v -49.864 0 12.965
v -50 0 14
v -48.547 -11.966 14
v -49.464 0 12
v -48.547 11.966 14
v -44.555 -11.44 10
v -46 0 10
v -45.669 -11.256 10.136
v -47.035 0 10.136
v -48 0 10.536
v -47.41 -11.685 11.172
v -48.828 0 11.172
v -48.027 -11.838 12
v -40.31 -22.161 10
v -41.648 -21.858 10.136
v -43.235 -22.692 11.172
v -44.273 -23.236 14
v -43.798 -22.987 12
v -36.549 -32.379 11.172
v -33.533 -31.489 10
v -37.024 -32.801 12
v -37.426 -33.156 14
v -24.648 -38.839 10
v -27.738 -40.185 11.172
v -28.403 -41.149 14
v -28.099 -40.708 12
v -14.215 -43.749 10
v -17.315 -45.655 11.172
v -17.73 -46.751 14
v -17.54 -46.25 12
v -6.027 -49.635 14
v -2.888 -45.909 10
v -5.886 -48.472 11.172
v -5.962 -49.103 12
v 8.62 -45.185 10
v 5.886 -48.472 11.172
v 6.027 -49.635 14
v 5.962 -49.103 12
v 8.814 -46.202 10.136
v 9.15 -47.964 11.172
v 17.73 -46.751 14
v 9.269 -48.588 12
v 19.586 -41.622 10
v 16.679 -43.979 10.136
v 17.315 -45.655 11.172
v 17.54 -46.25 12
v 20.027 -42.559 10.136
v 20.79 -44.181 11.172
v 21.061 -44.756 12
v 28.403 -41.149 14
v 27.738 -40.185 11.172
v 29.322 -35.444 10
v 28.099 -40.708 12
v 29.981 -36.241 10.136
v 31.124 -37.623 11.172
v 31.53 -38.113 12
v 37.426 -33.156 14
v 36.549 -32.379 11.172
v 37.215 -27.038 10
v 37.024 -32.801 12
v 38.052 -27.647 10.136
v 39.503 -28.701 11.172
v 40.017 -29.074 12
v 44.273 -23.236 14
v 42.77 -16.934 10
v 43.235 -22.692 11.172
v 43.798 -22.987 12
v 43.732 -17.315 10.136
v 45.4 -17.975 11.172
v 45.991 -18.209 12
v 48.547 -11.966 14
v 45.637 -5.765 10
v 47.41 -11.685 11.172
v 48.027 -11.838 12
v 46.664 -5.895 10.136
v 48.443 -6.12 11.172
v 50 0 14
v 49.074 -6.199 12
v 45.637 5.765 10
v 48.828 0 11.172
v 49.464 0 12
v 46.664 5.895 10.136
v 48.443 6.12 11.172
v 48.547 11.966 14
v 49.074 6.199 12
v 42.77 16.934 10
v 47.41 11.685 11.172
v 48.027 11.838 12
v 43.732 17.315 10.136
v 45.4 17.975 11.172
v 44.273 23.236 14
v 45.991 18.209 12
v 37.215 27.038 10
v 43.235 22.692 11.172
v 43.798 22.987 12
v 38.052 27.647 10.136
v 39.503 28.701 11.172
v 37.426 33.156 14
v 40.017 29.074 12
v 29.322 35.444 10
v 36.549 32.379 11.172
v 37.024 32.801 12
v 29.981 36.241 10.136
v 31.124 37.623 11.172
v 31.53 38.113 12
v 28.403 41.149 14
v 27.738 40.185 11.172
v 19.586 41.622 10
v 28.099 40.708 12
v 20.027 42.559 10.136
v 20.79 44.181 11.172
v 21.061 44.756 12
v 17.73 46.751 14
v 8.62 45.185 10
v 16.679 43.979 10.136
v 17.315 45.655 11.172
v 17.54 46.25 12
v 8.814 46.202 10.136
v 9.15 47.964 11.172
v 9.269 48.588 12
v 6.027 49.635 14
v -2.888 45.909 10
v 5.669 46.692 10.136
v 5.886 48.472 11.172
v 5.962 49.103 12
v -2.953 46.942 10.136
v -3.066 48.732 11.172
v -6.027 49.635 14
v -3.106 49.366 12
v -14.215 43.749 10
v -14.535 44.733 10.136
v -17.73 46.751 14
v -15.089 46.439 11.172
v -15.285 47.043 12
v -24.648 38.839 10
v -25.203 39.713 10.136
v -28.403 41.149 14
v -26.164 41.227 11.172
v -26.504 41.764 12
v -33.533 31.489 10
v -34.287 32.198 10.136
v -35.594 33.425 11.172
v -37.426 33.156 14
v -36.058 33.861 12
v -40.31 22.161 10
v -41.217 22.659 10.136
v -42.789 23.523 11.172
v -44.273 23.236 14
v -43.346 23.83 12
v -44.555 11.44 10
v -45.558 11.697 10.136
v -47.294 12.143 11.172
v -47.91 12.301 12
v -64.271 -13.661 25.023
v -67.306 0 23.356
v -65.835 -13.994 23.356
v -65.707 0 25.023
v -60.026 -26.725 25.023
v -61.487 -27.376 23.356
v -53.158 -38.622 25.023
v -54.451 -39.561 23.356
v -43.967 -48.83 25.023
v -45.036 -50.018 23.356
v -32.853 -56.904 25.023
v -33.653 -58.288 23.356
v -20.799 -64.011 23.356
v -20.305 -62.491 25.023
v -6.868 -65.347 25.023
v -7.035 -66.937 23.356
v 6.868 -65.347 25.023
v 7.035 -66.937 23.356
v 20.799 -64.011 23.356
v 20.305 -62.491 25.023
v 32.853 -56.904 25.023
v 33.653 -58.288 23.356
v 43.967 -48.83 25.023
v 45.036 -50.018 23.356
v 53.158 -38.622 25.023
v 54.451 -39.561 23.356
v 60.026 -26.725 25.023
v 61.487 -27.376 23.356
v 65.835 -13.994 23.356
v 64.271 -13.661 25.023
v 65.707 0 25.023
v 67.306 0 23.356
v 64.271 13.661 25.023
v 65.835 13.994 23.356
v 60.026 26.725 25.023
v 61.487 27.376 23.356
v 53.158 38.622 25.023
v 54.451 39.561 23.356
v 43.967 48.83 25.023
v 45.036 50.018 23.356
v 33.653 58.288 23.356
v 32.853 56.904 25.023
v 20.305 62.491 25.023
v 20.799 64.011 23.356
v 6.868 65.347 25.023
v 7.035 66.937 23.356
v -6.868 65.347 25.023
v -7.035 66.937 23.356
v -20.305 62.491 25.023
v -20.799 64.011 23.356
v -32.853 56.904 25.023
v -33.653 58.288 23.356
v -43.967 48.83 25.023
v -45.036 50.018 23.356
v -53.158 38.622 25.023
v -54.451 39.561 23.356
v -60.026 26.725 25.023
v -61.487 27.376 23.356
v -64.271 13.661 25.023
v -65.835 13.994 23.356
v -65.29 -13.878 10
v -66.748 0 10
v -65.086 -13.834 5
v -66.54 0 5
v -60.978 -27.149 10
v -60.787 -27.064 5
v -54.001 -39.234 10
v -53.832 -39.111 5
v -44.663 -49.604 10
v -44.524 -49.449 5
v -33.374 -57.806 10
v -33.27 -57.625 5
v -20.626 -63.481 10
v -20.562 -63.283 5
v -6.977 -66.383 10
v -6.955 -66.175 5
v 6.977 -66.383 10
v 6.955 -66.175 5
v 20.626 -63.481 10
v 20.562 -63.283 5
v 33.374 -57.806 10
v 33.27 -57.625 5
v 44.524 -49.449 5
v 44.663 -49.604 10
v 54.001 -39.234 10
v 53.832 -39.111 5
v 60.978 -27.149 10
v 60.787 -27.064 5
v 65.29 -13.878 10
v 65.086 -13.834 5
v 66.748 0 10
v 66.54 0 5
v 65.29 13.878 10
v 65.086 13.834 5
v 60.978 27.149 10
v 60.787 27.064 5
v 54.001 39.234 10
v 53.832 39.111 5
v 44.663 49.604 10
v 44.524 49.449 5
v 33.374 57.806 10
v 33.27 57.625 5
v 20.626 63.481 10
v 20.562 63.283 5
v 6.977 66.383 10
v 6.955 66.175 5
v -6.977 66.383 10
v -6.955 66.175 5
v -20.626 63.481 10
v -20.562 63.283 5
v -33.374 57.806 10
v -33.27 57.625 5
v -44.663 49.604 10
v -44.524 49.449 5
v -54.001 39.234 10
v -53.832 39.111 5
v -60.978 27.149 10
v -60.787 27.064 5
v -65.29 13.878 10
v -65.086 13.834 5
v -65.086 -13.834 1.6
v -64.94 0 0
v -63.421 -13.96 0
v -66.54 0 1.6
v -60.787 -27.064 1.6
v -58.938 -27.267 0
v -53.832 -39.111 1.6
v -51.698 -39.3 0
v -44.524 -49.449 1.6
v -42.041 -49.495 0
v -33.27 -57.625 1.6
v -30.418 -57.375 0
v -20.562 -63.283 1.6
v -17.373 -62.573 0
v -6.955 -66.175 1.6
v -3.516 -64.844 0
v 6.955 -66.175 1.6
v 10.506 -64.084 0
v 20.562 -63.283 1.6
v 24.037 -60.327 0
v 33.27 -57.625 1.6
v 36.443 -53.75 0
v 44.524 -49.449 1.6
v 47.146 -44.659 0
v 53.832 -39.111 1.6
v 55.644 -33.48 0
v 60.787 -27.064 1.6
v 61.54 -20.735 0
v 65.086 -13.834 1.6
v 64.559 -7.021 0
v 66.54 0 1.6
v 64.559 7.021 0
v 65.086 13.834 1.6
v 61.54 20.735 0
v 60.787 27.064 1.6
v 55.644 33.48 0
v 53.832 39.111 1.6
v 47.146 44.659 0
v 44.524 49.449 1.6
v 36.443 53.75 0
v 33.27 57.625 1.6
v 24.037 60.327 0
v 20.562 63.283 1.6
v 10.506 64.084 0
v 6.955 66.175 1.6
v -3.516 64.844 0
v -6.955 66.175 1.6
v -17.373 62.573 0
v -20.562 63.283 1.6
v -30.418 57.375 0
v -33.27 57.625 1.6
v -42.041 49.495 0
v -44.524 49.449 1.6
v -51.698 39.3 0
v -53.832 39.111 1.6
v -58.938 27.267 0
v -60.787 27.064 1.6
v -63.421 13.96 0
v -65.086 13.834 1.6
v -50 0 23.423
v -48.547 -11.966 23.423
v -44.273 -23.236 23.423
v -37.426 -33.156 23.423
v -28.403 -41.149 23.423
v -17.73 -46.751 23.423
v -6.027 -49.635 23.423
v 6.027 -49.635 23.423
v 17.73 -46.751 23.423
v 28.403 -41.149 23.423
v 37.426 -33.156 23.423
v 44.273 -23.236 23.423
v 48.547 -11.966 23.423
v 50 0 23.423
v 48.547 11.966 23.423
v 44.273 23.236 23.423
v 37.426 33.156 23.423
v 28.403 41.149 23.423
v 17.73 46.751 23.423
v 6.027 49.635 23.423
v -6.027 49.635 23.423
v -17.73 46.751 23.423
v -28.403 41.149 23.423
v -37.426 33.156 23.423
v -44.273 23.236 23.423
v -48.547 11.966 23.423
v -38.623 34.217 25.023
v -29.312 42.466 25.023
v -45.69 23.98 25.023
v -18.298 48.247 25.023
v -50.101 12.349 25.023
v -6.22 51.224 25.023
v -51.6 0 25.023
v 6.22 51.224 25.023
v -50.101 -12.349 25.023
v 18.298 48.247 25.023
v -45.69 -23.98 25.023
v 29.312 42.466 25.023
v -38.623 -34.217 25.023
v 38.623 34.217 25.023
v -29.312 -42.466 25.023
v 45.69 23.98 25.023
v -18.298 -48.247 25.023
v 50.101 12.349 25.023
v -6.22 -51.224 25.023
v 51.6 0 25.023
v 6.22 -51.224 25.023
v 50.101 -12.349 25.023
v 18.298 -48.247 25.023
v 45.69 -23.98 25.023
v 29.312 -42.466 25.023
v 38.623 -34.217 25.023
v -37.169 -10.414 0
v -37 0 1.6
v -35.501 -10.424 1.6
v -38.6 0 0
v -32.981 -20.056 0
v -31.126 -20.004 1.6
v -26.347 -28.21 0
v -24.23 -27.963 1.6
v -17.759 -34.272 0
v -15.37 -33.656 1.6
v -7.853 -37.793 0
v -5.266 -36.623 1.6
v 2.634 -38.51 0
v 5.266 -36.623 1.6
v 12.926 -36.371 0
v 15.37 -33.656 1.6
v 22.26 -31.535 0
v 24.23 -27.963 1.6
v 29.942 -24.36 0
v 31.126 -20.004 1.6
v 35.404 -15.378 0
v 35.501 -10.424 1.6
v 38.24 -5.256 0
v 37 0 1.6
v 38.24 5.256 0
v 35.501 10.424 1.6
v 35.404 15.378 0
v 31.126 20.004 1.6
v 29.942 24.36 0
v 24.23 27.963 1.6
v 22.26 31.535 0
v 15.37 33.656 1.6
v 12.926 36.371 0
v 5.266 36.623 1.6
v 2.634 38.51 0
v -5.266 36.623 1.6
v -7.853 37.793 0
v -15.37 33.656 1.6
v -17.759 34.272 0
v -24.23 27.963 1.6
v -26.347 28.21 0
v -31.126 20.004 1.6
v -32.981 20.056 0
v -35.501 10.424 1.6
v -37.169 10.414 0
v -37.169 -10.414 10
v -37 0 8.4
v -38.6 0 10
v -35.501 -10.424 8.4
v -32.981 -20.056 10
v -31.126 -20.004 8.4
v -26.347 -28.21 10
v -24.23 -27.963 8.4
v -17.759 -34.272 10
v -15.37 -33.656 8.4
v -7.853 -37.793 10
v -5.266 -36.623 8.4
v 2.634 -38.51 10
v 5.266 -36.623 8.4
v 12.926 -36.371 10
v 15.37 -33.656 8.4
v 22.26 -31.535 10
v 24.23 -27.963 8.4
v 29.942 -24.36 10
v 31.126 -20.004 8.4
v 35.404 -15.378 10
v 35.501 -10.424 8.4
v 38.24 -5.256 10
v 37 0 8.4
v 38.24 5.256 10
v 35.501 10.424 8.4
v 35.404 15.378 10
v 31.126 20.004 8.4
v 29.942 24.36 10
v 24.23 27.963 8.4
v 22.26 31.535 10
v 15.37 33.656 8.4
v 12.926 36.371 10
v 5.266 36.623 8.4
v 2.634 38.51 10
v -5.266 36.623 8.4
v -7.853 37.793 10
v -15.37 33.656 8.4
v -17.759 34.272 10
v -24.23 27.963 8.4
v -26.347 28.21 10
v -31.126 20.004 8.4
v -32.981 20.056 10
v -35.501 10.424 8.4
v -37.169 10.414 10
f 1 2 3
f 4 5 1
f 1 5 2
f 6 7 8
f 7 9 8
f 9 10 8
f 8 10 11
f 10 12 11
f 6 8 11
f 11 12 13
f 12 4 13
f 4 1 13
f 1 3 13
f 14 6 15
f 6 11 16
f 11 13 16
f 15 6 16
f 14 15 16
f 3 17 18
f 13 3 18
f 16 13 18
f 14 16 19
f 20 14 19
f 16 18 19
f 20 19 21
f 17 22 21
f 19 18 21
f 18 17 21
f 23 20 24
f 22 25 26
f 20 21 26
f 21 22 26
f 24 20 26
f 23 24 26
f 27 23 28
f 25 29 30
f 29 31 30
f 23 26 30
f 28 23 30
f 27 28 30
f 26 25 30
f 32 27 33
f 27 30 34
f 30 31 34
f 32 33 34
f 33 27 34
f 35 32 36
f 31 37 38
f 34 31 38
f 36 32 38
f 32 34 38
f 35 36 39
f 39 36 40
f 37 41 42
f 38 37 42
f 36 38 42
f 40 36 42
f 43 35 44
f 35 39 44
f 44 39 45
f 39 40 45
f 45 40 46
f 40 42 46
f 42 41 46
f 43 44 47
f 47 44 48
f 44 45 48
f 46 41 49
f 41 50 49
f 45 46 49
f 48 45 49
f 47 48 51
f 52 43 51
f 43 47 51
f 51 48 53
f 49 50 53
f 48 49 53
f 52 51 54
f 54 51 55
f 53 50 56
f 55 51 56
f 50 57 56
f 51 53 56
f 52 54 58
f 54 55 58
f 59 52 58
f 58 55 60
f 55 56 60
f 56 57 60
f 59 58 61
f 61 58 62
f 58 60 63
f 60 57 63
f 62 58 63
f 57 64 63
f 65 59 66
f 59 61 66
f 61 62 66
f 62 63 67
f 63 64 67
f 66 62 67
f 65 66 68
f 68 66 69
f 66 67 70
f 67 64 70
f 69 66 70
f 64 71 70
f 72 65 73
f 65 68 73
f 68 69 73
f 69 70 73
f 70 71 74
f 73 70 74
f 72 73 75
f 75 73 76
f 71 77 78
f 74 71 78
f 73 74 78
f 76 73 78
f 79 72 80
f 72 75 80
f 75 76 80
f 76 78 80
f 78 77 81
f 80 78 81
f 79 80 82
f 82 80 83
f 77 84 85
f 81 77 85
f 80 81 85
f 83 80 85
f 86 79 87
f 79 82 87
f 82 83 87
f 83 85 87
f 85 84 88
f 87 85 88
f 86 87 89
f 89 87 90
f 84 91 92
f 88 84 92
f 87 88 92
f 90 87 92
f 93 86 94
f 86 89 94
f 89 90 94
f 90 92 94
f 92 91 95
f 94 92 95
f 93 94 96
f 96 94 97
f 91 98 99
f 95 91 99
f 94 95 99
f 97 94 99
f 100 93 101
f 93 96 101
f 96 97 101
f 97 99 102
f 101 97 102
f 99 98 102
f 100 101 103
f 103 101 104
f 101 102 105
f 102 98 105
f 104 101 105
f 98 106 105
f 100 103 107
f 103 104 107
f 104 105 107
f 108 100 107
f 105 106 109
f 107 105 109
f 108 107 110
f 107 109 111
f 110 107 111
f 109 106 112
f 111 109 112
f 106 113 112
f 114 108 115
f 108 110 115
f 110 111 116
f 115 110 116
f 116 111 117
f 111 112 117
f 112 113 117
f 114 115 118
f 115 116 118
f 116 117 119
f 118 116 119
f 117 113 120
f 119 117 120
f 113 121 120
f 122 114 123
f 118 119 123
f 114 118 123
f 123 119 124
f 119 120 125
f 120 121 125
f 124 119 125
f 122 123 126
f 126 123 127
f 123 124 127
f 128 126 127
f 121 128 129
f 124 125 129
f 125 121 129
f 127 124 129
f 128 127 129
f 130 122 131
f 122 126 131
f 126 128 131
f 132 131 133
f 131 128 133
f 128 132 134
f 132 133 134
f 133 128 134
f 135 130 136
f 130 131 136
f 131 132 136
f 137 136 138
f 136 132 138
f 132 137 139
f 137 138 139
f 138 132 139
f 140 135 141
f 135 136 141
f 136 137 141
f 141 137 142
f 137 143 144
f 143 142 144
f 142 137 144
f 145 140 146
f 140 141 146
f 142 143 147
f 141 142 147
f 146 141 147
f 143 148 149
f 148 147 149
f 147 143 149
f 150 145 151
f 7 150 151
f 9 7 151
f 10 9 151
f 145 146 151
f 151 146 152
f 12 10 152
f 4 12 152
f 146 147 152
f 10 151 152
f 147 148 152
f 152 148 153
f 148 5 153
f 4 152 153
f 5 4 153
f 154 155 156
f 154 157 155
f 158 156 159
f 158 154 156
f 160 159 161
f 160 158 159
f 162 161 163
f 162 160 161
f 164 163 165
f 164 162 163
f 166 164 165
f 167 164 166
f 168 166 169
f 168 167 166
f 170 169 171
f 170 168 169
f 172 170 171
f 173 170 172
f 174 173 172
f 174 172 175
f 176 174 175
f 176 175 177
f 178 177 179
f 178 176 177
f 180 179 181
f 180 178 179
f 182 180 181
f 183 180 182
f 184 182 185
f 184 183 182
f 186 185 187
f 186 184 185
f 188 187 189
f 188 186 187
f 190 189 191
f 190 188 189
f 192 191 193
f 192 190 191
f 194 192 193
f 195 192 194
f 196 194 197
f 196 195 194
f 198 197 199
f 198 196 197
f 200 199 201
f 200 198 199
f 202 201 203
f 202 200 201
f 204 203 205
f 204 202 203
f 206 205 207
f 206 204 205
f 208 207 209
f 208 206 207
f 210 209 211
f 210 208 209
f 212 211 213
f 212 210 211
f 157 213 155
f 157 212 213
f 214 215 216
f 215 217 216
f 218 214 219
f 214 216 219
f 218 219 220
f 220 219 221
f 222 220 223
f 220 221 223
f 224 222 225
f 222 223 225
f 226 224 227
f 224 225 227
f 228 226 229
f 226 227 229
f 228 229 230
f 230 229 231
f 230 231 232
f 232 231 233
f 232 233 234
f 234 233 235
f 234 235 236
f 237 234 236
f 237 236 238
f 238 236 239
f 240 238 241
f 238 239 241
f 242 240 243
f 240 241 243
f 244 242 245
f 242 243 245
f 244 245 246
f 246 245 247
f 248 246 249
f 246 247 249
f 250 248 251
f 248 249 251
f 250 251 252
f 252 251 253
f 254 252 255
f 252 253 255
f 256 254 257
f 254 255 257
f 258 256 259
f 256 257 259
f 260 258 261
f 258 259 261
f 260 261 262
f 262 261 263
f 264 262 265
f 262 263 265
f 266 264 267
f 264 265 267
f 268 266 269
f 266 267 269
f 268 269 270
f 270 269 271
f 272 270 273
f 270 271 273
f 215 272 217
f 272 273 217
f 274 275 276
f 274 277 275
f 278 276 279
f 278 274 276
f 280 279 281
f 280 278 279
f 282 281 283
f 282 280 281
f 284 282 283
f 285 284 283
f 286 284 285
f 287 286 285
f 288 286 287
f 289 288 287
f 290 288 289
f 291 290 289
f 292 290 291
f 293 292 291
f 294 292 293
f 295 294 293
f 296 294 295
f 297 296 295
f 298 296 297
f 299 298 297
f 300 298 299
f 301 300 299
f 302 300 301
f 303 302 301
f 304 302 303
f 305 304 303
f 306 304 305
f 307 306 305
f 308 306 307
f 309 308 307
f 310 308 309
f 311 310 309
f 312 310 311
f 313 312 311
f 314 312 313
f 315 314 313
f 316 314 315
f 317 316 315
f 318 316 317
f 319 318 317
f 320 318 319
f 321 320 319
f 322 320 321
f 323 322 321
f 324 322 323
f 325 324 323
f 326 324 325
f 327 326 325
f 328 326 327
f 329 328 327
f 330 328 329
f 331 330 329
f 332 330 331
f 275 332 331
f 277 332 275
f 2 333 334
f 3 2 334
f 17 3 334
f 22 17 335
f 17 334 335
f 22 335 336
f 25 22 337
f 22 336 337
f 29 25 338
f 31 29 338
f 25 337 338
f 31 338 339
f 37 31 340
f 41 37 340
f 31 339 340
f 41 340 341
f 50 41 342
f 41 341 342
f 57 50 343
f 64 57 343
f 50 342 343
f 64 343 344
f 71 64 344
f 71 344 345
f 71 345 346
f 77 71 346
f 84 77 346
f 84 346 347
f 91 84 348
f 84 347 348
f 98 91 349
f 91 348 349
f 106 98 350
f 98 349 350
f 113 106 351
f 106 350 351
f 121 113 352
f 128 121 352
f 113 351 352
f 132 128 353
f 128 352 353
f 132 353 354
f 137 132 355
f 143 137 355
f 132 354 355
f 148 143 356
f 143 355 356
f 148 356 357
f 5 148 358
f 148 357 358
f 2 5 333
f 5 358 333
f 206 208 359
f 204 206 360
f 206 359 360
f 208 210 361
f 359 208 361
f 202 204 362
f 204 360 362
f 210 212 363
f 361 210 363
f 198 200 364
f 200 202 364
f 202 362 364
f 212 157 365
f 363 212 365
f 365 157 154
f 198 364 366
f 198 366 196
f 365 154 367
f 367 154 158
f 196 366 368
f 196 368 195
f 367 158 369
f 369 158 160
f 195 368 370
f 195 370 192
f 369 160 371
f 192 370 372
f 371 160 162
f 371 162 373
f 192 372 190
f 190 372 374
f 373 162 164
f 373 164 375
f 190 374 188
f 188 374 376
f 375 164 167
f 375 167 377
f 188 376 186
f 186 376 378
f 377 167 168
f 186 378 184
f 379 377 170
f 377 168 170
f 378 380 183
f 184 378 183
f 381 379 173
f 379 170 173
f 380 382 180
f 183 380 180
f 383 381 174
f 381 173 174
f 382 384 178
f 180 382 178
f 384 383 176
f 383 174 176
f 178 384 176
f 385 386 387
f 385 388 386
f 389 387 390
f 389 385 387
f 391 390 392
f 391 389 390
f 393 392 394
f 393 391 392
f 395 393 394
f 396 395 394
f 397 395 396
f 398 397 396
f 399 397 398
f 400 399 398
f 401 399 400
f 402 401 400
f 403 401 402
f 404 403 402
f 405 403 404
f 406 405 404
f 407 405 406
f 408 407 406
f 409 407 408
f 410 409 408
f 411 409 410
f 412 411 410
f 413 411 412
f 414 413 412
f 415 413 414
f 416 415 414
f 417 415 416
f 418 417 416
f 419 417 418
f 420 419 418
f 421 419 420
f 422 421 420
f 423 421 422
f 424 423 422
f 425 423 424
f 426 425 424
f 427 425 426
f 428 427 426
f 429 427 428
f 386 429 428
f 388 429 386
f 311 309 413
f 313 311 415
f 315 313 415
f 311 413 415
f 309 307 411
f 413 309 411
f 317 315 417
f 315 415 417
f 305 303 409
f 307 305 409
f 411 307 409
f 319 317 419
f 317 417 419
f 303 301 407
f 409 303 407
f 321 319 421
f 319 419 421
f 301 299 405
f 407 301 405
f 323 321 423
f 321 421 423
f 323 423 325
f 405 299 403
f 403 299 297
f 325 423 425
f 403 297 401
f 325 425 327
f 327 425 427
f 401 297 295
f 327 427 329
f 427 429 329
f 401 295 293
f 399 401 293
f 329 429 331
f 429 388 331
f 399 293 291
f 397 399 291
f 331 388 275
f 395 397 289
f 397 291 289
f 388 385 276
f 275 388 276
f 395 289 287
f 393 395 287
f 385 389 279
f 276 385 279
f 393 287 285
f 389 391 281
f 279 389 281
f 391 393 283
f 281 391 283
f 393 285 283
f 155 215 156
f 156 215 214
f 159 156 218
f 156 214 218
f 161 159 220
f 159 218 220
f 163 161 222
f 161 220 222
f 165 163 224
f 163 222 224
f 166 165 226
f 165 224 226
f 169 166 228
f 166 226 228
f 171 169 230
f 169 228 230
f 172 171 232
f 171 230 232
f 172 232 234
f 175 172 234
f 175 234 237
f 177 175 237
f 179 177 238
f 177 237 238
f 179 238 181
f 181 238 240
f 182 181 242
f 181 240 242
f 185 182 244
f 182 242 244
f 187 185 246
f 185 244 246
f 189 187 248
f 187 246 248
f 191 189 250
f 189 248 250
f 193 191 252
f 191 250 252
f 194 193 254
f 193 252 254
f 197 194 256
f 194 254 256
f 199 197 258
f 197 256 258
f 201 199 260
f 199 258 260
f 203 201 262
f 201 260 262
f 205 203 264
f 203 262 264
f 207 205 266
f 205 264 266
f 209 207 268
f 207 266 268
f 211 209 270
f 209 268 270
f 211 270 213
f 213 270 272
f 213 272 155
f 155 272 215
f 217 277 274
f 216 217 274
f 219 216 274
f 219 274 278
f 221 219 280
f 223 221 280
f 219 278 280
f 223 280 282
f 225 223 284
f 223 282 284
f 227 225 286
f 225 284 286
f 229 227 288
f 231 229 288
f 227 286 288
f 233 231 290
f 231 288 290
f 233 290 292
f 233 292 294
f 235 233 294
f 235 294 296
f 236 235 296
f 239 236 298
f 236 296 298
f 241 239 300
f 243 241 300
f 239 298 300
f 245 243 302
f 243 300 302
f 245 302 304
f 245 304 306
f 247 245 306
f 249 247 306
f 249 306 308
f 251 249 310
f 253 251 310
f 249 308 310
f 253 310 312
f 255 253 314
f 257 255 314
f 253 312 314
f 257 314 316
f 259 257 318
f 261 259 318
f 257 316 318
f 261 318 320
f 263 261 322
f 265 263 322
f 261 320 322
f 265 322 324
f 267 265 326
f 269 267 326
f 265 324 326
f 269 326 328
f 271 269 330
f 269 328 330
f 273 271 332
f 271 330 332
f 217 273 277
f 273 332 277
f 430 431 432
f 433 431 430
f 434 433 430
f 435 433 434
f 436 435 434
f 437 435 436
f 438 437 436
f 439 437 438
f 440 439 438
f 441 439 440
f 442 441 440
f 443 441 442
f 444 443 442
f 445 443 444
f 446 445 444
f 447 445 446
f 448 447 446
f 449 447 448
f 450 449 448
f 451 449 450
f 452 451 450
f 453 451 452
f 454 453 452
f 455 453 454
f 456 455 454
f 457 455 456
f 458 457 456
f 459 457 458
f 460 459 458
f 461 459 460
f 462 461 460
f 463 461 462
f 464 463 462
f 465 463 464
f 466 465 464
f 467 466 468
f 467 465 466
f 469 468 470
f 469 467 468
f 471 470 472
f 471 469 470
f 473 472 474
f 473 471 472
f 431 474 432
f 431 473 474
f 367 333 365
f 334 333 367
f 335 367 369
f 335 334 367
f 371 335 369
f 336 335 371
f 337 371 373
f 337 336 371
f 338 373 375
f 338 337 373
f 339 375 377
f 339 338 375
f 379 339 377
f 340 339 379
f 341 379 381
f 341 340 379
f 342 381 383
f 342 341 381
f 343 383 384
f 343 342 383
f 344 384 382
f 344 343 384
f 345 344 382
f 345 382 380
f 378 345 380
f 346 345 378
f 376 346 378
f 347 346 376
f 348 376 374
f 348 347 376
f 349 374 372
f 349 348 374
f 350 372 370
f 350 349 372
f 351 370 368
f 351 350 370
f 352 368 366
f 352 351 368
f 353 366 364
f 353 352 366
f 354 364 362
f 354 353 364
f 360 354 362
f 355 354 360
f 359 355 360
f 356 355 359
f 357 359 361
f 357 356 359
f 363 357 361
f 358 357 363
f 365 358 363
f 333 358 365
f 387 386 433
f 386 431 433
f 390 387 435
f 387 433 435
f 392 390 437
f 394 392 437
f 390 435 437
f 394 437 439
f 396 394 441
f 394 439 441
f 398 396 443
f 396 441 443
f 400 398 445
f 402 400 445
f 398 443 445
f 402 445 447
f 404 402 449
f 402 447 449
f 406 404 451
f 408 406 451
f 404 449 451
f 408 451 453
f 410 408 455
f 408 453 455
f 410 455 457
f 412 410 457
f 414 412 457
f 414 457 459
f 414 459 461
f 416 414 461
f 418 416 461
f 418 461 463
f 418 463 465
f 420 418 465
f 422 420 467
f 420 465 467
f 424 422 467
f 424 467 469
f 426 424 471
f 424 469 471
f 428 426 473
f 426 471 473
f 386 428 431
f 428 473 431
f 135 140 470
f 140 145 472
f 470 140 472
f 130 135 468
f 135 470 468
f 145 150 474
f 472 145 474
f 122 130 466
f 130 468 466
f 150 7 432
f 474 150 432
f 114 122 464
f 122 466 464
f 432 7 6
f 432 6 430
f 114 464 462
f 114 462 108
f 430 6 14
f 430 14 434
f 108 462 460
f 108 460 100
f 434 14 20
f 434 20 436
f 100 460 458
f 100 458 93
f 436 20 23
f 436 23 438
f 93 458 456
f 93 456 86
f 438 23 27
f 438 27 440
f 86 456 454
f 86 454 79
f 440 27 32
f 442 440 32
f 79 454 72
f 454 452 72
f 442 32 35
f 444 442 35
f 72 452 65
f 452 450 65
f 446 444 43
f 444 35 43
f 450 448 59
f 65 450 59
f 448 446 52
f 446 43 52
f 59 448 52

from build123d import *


# Not quite as in the source:
# - a fillet or chamfer that OpenCascade refuses, or shapes differently, is made with other operations: its cross-section is extruded or revolved along the edge and cut away or added


with BuildPart() as f1:
    # F0 (on Front) → F1 (revolve)
    with BuildSketch(Plane.XZ):
        with BuildLine():
            Line((-66.7483291848, 10), (-66.5397158787, 5))
            Line((-66.5397158787, 5), (-66.5397158787, 0))
            Line((-66.5397158787, 0), (-37, 0))
            Line((-37, 0), (-37, 10))
            Line((-37, 10), (-46, 10))
            ThreePointArc((-46, 10), (-48.8284271247, 11.1715728753), (-50, 14))
            Line((-50, 14), (-50, 25.0225278729))
            Line((-50, 25.0225278729), (-67.375109026, 25.0225278729))
            Line((-67.375109026, 25.0225278729), (-66.7483291848, 10))
        make_face()
    revolve(axis=Axis((0, 0, 30.7617206126), (0, 0, 1)))

    # F2: chamfer of 1.6 on 5 edges, made by hand

    # F2_s1 → F2_t2 (revolve, cut)
    with BuildSketch(Plane.XZ):
        Polygon((-38.6, 10), (-37, 8.4), (-37, 10), align=None)
    revolve(axis=Axis((0, 0, 10), (0, 0, 1)), mode=Mode.SUBTRACT)

    # F2_s3 → F2_t4 (revolve, cut)
    with BuildSketch(Plane.XZ):
        Polygon((-37, 1.6), (-38.6, 0), (-37, 0), align=None)
    revolve(axis=Axis((0, 0, 0), (0, 0, 1)), mode=Mode.SUBTRACT)

    # F2_s5 → F2_t6 (revolve, cut)
    with BuildSketch(Plane.XZ):
        Polygon((-64.9397158787, 0), (-66.5397158787, 1.6), (-66.5397158787, 0), align=None)
    revolve(axis=Axis((0, 0, 0), (0, 0, 1)), mode=Mode.SUBTRACT)

    # F2_s7 → F2_t8 (revolve, cut)
    with BuildSketch(Plane.XZ):
        Polygon((-51.6, 25.0225278729), (-50, 23.4225278729), (-50, 25.0225278729), align=None)
    revolve(axis=Axis((0, 0, 25.0225278729), (0, 0, 1)), mode=Mode.SUBTRACT)

    # F2_s9 → F2_t10 (revolve, cut)
    with BuildSketch(Plane.XZ):
        Polygon((-67.3055699404, 23.3558296431), (-65.7069607492, 25.0225278729), (-67.375109026, 25.0225278729), align=None)
    revolve(axis=Axis((0, 0, 25.0225278729), (0, 0, 1)), mode=Mode.SUBTRACT)


solid = f1.part
